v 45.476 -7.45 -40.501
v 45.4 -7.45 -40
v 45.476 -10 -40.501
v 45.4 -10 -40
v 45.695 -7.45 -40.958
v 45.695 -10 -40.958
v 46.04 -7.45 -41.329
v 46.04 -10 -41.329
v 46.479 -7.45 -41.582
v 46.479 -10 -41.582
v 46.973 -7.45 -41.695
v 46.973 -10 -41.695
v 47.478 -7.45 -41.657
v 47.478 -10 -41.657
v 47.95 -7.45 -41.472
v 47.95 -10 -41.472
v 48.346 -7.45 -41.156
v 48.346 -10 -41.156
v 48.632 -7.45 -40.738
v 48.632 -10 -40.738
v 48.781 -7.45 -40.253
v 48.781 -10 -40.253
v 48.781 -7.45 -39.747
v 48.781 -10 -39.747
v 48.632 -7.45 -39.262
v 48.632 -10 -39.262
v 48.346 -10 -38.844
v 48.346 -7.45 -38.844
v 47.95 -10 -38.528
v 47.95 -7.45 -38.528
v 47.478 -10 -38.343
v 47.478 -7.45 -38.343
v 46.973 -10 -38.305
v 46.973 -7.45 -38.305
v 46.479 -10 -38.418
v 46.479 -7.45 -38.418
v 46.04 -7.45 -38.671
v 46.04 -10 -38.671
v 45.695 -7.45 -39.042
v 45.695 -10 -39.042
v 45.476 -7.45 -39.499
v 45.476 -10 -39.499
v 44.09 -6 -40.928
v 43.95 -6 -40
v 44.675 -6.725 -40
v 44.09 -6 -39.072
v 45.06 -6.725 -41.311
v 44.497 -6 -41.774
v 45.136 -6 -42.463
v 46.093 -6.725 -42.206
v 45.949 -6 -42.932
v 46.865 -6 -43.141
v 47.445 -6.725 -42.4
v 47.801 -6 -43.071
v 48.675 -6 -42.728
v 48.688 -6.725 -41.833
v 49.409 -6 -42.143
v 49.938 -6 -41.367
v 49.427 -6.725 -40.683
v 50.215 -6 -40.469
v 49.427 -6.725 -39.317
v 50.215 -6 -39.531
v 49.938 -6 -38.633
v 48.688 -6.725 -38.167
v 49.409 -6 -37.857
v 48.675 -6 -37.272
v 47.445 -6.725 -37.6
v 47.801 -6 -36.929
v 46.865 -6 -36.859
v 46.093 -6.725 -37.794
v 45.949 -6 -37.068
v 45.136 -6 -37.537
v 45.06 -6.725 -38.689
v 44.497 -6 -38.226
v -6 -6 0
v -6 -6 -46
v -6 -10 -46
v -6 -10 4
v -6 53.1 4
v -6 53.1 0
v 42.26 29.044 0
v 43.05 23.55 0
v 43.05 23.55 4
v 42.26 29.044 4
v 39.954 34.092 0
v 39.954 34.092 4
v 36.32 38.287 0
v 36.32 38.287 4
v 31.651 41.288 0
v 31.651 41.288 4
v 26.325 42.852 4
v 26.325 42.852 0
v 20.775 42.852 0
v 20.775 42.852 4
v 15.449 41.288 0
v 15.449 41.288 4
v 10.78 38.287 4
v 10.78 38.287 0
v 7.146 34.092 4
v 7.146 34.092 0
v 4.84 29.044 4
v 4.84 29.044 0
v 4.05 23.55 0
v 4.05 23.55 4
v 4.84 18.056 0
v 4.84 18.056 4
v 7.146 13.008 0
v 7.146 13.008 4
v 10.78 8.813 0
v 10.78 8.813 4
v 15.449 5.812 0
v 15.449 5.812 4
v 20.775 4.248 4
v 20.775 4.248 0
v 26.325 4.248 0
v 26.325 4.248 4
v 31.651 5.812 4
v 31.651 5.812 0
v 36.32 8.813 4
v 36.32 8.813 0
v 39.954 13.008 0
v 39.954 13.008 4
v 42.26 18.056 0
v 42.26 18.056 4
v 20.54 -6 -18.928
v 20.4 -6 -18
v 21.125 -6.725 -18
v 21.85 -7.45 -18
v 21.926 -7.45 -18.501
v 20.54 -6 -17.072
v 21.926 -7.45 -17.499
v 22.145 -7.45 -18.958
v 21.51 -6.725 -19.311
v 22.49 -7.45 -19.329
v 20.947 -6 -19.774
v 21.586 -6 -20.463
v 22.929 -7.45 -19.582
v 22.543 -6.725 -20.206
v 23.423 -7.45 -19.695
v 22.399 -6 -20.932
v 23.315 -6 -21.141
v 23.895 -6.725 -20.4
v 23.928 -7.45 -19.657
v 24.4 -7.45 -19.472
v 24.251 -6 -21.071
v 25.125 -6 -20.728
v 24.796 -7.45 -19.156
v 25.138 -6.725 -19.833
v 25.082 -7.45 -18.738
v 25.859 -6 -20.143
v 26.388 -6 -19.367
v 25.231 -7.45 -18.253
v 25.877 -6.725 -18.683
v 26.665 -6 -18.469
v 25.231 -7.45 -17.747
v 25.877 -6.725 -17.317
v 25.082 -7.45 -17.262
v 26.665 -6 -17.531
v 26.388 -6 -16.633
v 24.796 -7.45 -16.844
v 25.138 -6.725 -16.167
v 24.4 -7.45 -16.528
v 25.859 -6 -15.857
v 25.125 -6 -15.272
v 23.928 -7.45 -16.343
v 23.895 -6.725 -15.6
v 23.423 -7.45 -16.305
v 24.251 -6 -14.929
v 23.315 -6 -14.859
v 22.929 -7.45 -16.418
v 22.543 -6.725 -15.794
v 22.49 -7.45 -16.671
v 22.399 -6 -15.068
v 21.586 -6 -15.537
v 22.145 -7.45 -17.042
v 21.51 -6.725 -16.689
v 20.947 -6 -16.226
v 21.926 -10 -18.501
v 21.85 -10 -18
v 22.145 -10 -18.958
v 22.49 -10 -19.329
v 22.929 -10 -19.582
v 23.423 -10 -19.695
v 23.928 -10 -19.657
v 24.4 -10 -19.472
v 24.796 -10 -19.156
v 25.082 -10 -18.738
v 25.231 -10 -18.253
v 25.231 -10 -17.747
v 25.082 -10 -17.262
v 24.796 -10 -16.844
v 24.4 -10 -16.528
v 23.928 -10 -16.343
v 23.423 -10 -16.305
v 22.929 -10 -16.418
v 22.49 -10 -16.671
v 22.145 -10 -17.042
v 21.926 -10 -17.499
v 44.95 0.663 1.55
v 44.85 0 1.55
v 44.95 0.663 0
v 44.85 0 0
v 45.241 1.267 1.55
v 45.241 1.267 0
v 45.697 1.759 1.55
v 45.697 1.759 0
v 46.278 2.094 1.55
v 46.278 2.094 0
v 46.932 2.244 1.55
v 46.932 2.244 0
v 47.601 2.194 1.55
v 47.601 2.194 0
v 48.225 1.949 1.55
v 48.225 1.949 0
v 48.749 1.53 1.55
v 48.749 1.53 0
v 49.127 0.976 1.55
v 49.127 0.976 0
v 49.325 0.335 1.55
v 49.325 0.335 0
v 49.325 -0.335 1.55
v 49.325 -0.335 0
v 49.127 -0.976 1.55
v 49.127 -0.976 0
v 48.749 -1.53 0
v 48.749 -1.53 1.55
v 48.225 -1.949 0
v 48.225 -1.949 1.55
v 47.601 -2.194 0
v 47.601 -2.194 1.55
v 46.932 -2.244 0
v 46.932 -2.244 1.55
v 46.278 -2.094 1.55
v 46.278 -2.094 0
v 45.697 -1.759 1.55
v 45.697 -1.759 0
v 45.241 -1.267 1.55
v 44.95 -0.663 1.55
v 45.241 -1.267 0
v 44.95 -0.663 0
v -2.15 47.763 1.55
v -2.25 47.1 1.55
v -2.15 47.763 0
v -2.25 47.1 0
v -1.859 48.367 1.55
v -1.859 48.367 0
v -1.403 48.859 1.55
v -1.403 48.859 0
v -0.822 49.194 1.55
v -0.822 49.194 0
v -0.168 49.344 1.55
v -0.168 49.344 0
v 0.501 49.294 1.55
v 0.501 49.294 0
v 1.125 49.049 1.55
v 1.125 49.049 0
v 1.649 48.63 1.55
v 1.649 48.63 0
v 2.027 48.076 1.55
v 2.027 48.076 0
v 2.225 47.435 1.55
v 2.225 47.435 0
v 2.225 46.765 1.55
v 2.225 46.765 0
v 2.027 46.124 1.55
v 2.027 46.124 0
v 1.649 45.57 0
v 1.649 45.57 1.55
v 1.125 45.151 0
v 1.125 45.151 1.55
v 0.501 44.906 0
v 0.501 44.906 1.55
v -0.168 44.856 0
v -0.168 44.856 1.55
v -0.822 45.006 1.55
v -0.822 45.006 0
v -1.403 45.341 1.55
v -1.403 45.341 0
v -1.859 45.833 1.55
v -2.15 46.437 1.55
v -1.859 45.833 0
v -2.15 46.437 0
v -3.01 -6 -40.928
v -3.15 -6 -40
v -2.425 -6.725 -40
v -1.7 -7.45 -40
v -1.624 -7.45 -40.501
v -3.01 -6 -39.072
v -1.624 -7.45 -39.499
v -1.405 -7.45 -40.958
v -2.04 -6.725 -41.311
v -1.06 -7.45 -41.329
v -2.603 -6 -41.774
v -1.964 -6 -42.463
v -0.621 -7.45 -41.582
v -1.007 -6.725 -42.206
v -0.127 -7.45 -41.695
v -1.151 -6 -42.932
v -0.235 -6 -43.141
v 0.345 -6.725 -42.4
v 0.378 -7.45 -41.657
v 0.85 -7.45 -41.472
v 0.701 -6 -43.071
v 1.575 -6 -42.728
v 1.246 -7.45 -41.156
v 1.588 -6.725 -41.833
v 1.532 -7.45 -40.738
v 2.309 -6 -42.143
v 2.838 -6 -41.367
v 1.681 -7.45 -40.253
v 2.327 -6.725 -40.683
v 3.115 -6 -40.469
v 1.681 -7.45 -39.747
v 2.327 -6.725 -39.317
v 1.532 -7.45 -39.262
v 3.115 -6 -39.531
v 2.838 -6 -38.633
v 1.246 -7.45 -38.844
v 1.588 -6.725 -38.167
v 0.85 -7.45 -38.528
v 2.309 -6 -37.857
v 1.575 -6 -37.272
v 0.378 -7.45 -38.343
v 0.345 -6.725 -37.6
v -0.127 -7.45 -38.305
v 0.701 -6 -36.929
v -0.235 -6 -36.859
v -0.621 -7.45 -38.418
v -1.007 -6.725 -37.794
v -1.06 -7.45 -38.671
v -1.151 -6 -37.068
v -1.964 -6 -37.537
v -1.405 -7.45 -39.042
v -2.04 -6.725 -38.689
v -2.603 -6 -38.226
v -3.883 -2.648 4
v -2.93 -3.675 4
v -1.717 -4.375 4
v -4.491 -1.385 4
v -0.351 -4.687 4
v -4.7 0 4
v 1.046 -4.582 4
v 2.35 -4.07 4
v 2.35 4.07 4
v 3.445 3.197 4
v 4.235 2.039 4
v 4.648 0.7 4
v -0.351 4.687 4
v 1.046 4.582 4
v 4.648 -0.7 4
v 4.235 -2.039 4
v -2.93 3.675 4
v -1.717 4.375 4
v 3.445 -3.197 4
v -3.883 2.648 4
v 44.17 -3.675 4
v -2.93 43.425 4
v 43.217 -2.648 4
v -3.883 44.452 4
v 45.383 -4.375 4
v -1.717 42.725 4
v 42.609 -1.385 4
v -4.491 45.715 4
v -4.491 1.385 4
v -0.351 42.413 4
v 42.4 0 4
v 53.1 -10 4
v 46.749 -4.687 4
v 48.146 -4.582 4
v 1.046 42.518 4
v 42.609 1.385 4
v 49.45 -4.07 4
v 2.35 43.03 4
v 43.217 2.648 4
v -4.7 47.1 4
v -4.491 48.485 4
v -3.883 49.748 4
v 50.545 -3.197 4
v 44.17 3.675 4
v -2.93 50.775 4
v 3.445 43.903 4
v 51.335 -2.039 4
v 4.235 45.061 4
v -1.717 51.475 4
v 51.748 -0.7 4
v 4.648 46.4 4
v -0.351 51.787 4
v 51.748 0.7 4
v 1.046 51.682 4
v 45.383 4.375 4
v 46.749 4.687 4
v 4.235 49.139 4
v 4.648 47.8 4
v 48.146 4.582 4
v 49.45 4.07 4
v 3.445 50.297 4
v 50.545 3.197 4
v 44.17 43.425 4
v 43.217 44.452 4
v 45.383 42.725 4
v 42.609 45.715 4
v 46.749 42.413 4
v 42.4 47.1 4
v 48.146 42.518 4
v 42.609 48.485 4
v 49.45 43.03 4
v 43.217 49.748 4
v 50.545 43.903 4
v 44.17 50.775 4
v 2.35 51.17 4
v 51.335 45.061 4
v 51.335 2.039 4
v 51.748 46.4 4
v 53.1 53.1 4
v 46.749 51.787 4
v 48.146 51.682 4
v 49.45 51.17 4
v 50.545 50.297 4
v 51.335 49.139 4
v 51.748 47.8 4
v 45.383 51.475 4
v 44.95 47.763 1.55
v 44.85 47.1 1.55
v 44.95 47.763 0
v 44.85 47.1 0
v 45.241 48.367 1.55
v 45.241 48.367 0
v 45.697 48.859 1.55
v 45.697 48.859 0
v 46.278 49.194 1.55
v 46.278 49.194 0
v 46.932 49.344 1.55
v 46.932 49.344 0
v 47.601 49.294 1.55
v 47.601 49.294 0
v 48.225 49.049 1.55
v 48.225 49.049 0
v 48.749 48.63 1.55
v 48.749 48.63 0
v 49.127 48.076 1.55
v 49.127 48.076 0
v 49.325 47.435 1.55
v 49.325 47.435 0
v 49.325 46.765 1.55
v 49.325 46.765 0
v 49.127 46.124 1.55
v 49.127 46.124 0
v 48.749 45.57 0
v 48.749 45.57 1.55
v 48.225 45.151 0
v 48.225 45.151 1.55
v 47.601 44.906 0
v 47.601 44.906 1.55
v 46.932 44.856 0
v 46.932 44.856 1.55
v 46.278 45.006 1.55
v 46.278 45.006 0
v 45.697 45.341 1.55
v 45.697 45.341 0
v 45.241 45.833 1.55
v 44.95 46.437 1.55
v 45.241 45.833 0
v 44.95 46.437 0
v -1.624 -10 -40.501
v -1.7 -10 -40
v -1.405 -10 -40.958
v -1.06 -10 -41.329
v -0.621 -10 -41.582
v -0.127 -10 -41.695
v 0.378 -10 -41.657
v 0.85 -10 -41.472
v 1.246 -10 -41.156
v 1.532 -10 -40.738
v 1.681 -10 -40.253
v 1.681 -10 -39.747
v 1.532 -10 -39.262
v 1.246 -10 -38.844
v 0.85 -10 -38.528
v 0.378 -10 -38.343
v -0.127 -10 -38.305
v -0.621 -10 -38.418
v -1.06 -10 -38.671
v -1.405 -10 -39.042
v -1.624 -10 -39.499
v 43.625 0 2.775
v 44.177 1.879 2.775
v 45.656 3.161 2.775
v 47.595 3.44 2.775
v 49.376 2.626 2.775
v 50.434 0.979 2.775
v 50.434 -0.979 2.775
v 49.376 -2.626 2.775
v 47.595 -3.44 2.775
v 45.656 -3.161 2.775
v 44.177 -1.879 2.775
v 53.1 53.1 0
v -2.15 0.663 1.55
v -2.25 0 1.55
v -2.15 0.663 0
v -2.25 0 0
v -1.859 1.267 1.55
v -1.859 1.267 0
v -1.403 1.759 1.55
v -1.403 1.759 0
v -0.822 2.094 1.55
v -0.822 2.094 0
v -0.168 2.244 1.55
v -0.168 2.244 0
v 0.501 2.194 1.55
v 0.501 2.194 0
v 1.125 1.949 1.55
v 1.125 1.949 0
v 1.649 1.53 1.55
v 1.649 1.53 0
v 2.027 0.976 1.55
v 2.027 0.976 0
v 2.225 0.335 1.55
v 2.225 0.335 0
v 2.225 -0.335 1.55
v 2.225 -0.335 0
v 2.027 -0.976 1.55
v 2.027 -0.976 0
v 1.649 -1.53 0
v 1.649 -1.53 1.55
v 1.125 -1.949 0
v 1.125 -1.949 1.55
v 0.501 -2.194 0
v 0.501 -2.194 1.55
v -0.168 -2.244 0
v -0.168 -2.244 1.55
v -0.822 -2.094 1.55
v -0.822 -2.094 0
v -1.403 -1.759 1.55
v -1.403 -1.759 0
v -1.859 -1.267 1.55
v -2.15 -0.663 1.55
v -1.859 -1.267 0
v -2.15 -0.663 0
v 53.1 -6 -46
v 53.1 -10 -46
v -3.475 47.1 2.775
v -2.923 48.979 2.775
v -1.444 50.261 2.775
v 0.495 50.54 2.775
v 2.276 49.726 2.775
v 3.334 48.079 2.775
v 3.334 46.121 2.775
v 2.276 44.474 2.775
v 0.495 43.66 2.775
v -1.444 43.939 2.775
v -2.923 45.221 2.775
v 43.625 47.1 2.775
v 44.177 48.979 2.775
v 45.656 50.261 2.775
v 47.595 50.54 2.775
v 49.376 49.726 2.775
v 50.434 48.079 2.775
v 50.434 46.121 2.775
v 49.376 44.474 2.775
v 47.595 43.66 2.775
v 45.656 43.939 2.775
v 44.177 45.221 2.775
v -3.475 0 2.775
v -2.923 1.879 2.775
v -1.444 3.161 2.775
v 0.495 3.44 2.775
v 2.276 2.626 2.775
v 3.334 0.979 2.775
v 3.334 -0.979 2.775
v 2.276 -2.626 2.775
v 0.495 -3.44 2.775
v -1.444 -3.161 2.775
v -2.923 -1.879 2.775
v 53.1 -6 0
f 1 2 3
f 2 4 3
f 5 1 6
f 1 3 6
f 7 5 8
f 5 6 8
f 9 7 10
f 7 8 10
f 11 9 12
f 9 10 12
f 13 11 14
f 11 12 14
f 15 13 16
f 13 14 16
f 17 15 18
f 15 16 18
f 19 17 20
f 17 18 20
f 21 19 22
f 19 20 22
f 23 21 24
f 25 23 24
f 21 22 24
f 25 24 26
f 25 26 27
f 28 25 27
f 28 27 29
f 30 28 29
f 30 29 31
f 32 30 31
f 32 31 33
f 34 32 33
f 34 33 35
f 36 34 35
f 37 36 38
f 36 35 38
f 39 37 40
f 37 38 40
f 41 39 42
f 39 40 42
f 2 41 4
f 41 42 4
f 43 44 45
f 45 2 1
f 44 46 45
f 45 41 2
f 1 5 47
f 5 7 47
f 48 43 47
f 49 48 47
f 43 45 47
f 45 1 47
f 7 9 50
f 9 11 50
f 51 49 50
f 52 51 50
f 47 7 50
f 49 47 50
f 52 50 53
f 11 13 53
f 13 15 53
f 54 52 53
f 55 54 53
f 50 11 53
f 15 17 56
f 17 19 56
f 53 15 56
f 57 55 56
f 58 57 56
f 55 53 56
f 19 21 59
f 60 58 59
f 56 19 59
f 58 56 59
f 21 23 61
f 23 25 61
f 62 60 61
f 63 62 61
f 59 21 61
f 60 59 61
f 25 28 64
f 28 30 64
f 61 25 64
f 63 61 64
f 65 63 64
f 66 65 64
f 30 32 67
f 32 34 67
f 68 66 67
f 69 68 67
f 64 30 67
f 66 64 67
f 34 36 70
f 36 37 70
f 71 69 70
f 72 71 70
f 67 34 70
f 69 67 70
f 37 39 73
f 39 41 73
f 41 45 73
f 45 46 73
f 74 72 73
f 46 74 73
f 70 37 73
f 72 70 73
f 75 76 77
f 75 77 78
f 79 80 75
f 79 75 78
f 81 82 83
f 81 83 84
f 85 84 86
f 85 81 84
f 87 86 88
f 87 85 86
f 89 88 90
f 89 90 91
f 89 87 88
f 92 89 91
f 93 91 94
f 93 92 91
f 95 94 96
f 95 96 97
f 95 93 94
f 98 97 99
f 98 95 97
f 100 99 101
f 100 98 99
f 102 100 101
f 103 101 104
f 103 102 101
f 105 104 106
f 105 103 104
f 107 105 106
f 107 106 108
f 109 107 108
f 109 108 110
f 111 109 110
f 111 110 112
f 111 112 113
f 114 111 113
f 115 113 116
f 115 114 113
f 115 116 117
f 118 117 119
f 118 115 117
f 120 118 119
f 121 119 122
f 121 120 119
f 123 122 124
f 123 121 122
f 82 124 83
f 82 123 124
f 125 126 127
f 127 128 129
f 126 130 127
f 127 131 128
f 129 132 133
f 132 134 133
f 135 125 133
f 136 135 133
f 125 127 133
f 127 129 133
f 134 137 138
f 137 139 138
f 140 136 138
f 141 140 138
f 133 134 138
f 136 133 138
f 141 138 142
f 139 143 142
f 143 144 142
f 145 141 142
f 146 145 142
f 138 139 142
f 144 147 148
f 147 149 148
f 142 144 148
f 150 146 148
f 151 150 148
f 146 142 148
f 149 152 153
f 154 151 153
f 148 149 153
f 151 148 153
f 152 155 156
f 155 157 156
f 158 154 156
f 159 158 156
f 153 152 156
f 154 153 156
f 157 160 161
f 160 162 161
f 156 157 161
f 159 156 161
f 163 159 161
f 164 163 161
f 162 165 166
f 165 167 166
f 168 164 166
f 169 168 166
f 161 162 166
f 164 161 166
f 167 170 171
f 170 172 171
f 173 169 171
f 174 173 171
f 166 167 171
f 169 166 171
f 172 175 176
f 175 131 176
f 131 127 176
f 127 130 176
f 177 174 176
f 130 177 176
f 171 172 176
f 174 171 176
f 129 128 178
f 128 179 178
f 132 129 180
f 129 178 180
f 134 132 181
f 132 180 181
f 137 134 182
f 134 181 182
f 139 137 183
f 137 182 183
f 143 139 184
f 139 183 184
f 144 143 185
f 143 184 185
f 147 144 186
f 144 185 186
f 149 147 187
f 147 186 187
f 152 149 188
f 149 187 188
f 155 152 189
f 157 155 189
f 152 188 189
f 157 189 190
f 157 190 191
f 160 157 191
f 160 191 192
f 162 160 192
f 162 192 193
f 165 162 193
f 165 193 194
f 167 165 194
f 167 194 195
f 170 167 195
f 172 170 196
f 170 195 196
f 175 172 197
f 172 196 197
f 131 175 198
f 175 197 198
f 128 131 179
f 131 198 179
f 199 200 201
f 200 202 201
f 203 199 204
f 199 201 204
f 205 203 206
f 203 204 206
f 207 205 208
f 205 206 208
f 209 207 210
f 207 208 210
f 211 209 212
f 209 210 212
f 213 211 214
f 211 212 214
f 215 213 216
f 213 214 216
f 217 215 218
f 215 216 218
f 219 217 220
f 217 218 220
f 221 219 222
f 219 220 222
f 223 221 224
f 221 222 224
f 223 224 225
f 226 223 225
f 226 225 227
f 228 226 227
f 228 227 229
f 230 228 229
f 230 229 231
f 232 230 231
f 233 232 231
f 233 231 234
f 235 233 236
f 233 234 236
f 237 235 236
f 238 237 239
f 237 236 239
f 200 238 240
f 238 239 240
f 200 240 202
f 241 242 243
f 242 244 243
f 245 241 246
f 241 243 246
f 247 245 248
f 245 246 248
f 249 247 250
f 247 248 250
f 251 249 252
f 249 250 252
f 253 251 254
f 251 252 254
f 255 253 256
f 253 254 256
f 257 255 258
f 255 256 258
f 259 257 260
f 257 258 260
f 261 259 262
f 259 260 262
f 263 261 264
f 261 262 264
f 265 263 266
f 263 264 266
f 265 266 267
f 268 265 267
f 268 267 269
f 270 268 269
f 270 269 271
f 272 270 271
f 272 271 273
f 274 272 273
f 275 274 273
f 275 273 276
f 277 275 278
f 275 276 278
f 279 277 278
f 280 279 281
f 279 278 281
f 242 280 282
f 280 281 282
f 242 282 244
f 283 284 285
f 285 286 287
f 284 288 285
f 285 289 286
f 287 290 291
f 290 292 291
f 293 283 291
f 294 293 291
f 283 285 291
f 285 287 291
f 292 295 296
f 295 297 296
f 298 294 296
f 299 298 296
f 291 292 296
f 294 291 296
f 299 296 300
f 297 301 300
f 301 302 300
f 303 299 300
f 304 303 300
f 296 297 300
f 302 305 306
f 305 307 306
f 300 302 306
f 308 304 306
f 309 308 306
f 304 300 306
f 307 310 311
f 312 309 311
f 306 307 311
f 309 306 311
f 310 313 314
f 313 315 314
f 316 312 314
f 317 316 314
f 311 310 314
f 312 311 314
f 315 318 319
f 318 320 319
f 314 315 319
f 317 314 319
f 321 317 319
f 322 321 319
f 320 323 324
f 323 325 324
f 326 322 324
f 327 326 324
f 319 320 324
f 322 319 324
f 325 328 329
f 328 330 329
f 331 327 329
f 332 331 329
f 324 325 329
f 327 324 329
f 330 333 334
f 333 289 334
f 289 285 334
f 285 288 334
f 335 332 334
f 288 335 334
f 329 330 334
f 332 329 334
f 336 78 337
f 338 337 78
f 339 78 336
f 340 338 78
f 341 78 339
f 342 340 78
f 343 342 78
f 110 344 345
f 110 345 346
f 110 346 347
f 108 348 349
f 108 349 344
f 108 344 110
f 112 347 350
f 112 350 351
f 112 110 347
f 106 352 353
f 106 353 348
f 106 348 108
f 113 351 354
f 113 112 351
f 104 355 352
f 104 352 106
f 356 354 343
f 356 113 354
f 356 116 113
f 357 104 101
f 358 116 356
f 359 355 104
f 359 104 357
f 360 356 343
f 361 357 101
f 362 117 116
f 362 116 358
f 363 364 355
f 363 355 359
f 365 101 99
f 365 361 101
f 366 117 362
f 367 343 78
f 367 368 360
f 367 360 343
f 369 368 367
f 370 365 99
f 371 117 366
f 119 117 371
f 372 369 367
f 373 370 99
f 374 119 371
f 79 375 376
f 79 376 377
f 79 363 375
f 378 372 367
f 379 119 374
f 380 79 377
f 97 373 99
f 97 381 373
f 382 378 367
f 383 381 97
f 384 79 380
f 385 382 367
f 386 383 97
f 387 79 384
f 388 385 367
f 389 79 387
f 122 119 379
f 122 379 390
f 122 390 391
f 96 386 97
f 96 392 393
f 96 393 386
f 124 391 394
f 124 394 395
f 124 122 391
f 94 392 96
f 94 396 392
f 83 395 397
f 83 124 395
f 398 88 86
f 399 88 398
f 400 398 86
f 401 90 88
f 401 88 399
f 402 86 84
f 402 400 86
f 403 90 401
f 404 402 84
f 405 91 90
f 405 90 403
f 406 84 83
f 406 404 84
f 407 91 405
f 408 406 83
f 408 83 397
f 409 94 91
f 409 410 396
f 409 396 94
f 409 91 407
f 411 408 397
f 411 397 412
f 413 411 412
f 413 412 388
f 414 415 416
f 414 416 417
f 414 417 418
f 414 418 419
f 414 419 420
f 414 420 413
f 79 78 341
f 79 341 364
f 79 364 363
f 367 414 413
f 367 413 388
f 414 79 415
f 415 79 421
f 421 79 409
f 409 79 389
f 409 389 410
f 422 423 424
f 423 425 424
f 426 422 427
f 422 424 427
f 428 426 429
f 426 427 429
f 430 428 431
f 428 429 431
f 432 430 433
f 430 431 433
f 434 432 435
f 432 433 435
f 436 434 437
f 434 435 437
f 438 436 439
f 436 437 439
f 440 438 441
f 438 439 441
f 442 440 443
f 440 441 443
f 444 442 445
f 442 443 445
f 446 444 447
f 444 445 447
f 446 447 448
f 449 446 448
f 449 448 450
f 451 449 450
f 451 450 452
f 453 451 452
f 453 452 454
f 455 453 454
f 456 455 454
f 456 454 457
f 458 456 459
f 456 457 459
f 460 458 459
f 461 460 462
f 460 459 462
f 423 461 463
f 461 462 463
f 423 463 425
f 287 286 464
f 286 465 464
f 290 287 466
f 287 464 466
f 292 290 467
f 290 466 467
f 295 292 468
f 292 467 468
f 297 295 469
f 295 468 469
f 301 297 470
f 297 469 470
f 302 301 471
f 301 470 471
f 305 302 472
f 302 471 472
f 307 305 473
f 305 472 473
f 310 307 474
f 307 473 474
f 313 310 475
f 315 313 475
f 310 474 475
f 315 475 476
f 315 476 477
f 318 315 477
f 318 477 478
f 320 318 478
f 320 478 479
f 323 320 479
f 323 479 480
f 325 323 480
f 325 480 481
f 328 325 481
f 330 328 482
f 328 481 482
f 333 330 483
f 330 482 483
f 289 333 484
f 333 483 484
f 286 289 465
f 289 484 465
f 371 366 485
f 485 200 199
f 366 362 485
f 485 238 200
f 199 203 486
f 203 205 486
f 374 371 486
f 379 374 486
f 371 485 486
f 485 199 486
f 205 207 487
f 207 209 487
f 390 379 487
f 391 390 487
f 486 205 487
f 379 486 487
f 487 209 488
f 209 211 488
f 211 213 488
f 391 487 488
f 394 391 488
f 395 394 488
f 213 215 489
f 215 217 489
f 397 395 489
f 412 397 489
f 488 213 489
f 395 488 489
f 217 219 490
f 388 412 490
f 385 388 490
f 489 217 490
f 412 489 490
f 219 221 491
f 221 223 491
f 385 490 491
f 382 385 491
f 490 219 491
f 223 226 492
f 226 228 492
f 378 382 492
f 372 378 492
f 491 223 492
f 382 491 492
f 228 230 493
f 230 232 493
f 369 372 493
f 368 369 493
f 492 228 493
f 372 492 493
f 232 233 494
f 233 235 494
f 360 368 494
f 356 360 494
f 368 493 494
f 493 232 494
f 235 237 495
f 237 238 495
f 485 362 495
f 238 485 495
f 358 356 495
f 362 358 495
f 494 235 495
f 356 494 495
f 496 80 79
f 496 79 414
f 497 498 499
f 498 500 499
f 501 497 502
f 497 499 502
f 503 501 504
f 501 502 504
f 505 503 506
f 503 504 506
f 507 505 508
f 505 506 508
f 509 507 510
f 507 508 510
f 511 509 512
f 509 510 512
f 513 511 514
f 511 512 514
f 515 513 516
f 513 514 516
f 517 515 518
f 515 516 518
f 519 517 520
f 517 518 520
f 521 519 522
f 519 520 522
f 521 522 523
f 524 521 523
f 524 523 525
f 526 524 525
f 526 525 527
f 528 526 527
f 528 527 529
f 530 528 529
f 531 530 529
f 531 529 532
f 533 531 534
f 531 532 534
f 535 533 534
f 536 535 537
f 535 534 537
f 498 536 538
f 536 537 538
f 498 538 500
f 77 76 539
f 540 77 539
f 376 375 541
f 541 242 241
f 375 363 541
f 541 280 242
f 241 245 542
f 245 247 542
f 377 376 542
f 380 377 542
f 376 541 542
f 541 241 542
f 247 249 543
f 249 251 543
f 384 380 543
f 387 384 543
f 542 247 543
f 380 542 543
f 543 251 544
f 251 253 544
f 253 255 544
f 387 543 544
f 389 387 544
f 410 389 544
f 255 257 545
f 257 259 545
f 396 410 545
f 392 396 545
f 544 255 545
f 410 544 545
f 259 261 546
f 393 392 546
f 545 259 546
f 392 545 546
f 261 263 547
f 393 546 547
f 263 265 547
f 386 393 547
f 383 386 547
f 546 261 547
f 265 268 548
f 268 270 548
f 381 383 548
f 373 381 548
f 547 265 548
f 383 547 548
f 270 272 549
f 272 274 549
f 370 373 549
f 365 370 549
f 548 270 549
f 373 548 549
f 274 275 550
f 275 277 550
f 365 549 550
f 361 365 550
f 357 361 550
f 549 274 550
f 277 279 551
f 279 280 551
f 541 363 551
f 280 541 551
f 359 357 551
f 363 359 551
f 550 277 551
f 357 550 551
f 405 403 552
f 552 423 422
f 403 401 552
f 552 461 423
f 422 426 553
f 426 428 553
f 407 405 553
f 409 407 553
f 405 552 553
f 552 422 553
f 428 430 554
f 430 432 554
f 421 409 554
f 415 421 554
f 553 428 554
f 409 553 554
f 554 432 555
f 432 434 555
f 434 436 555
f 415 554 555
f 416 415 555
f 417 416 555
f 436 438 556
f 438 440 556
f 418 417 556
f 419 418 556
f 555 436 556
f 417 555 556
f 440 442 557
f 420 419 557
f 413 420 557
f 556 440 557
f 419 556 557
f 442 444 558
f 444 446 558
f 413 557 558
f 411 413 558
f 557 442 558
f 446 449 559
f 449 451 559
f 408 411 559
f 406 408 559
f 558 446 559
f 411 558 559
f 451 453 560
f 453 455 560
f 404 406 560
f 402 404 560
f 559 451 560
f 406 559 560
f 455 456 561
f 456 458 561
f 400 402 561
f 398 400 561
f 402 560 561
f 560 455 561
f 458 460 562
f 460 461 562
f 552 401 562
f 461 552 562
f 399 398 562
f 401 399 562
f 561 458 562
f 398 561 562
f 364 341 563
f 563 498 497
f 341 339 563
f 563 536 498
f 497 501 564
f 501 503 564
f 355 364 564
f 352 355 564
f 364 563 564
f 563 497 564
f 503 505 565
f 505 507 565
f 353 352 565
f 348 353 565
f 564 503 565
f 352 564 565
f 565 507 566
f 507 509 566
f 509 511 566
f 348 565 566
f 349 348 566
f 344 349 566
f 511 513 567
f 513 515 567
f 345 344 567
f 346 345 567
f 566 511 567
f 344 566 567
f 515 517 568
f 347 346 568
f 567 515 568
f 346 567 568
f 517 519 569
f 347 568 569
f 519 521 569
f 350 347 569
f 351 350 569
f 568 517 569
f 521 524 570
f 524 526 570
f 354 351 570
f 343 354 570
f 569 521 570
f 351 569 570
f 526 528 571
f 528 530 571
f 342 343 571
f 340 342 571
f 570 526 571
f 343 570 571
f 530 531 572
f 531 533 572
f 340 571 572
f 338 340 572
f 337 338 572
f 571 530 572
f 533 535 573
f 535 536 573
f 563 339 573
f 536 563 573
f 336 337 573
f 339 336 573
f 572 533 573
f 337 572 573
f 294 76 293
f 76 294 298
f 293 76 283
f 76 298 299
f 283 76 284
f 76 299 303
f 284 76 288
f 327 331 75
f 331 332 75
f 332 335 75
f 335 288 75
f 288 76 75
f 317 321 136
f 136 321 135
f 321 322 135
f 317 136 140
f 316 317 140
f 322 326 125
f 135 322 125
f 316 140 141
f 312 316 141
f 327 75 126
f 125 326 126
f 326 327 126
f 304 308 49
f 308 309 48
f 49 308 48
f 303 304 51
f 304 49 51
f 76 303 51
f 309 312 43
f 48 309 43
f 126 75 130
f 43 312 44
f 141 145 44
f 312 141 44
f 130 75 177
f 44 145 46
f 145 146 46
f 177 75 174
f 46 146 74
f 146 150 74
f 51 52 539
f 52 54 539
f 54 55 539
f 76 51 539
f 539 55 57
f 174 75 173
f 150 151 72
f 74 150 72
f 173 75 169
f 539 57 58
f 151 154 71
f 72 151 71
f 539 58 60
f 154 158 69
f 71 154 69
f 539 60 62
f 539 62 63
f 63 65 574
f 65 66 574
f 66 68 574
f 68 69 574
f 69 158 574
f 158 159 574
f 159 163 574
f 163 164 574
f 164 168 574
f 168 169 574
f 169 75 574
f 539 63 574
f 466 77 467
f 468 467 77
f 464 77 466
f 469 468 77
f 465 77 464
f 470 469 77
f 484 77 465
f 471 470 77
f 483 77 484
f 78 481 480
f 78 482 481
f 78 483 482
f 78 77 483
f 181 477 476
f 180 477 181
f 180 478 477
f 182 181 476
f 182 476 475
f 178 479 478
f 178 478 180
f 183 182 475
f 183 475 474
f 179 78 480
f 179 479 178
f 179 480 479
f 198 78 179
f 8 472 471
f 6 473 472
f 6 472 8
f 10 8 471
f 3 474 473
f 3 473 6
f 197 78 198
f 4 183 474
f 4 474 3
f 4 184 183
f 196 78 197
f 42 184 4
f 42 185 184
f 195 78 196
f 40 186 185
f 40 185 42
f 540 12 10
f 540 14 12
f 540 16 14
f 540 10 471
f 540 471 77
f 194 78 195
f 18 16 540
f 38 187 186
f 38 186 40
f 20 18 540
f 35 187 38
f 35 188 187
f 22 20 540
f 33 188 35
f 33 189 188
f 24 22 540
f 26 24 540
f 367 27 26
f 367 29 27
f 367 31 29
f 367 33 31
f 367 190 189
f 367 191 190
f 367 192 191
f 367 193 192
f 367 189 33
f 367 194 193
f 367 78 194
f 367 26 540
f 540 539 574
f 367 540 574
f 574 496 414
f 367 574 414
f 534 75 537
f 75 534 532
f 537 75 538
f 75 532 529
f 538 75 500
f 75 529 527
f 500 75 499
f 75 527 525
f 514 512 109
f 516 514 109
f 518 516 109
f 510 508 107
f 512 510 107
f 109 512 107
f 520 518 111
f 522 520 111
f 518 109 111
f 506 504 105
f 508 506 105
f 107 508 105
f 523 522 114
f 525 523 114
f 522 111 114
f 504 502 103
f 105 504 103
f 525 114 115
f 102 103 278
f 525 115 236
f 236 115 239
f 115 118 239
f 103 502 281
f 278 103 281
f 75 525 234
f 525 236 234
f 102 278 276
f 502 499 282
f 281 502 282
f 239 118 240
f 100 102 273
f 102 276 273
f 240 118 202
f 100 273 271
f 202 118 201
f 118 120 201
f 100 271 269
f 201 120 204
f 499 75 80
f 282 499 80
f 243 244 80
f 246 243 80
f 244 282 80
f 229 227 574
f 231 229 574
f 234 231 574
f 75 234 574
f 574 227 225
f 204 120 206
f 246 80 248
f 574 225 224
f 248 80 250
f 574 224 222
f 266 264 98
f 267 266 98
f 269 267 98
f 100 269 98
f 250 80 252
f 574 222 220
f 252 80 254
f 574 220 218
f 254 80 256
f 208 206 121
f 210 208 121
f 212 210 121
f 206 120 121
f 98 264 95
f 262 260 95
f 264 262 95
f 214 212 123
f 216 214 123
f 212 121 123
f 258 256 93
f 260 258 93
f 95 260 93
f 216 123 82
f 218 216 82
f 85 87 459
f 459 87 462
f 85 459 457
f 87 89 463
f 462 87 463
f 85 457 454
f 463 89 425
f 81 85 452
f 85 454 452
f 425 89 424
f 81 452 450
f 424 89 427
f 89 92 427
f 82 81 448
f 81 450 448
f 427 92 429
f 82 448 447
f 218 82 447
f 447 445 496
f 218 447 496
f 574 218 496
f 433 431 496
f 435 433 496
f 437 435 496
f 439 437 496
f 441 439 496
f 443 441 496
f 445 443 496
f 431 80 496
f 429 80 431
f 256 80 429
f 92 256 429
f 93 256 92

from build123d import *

# Parameters (mm, degrees)
SKETCH1_W                                       = 59.1
SKETCH1_H                                       = 59.1
SKETCH1_R                                       = 19.5
SKETCH1_R_2                                     = 1.55
BOSS_EXTRUDE1_DEPTH                             = 4
SKETCH2_W                                       = 59.1
SKETCH2_H                                       = 50
SKETCH2_R                                       = 1.5
BOSS_EXTRUDE2_DEPTH                             = 4
CSK_FOR_M3_FLAT_HEAD_MACHINE_SCREW1_D           = 3.4
CSK_FOR_M3_FLAT_HEAD_MACHINE_SCREW1_CSINK_D     = 6.3
CSK_FOR_M3_FLAT_HEAD_MACHINE_SCREW1_CSINK_ANGLE = 90
CSK_FOR_M4_FLAT_HEAD_MACHINE_SCREW1_D           = 4.5
CSK_FOR_M4_FLAT_HEAD_MACHINE_SCREW1_CSINK_D     = 9.4
CSK_FOR_M4_FLAT_HEAD_MACHINE_SCREW1_CSINK_ANGLE = 90


with BuildPart() as part:
    # Sketch1 → Boss-Extrude1 (new body)
    with BuildSketch(Plane.XY):
        with Locations((23.55, 23.55)):
            Rectangle(SKETCH1_W, SKETCH1_H)
        with Locations((23.55, 23.55)):
            Circle(SKETCH1_R, mode=Mode.SUBTRACT)
        with Locations((0, 47.1)):
            Circle(SKETCH1_R_2, mode=Mode.SUBTRACT)
        with Locations((47.1, 47.1)):
            Circle(SKETCH1_R_2, mode=Mode.SUBTRACT)
        with Locations((47.1, 0)):
            Circle(SKETCH1_R_2, mode=Mode.SUBTRACT)
        Circle(SKETCH1_R_2, mode=Mode.SUBTRACT)
    extrude(amount=BOSS_EXTRUDE1_DEPTH)

    # Sketch2 → Boss-Extrude2 (add)
    with BuildSketch(Plane.XZ.offset(6)):
        with Locations((23.55, -21)):
            Rectangle(SKETCH2_W, SKETCH2_H)
        with Locations(Location((0, -40, 0), (0, 0, 270))):
            Circle(SKETCH2_R, mode=Mode.SUBTRACT)
        with Locations(Location((47.1, -40, 0), (0, 0, 270))):
            Circle(SKETCH2_R, mode=Mode.SUBTRACT)
        with Locations(Location((23.55, -18, 0), (0, 0, 270))):
            Circle(SKETCH2_R, mode=Mode.SUBTRACT)
    extrude(amount=BOSS_EXTRUDE2_DEPTH)

    # CSK for M3 Flat Head Machine Screw1 (through all)
    with Locations(Plane(origin=(0, -6, 0), x_dir=(1, 0, 0), z_dir=(0, 1, 0))):
        with Locations((0, 40), (47.1, 40), (23.55, 18)):
            CounterSinkHole(CSK_FOR_M3_FLAT_HEAD_MACHINE_SCREW1_D / 2, CSK_FOR_M3_FLAT_HEAD_MACHINE_SCREW1_CSINK_D / 2, counter_sink_angle=CSK_FOR_M3_FLAT_HEAD_MACHINE_SCREW1_CSINK_ANGLE)

    # CSK for M4 Flat Head Machine Screw1 (through all)
    with Locations(Plane.XY.offset(4)):
        with Locations((0, 47.1), (47.1, 47.1), (47.1, 0), (0, 0)):
            CounterSinkHole(CSK_FOR_M4_FLAT_HEAD_MACHINE_SCREW1_D / 2, CSK_FOR_M4_FLAT_HEAD_MACHINE_SCREW1_CSINK_D / 2, counter_sink_angle=CSK_FOR_M4_FLAT_HEAD_MACHINE_SCREW1_CSINK_ANGLE)


solid = part.part
